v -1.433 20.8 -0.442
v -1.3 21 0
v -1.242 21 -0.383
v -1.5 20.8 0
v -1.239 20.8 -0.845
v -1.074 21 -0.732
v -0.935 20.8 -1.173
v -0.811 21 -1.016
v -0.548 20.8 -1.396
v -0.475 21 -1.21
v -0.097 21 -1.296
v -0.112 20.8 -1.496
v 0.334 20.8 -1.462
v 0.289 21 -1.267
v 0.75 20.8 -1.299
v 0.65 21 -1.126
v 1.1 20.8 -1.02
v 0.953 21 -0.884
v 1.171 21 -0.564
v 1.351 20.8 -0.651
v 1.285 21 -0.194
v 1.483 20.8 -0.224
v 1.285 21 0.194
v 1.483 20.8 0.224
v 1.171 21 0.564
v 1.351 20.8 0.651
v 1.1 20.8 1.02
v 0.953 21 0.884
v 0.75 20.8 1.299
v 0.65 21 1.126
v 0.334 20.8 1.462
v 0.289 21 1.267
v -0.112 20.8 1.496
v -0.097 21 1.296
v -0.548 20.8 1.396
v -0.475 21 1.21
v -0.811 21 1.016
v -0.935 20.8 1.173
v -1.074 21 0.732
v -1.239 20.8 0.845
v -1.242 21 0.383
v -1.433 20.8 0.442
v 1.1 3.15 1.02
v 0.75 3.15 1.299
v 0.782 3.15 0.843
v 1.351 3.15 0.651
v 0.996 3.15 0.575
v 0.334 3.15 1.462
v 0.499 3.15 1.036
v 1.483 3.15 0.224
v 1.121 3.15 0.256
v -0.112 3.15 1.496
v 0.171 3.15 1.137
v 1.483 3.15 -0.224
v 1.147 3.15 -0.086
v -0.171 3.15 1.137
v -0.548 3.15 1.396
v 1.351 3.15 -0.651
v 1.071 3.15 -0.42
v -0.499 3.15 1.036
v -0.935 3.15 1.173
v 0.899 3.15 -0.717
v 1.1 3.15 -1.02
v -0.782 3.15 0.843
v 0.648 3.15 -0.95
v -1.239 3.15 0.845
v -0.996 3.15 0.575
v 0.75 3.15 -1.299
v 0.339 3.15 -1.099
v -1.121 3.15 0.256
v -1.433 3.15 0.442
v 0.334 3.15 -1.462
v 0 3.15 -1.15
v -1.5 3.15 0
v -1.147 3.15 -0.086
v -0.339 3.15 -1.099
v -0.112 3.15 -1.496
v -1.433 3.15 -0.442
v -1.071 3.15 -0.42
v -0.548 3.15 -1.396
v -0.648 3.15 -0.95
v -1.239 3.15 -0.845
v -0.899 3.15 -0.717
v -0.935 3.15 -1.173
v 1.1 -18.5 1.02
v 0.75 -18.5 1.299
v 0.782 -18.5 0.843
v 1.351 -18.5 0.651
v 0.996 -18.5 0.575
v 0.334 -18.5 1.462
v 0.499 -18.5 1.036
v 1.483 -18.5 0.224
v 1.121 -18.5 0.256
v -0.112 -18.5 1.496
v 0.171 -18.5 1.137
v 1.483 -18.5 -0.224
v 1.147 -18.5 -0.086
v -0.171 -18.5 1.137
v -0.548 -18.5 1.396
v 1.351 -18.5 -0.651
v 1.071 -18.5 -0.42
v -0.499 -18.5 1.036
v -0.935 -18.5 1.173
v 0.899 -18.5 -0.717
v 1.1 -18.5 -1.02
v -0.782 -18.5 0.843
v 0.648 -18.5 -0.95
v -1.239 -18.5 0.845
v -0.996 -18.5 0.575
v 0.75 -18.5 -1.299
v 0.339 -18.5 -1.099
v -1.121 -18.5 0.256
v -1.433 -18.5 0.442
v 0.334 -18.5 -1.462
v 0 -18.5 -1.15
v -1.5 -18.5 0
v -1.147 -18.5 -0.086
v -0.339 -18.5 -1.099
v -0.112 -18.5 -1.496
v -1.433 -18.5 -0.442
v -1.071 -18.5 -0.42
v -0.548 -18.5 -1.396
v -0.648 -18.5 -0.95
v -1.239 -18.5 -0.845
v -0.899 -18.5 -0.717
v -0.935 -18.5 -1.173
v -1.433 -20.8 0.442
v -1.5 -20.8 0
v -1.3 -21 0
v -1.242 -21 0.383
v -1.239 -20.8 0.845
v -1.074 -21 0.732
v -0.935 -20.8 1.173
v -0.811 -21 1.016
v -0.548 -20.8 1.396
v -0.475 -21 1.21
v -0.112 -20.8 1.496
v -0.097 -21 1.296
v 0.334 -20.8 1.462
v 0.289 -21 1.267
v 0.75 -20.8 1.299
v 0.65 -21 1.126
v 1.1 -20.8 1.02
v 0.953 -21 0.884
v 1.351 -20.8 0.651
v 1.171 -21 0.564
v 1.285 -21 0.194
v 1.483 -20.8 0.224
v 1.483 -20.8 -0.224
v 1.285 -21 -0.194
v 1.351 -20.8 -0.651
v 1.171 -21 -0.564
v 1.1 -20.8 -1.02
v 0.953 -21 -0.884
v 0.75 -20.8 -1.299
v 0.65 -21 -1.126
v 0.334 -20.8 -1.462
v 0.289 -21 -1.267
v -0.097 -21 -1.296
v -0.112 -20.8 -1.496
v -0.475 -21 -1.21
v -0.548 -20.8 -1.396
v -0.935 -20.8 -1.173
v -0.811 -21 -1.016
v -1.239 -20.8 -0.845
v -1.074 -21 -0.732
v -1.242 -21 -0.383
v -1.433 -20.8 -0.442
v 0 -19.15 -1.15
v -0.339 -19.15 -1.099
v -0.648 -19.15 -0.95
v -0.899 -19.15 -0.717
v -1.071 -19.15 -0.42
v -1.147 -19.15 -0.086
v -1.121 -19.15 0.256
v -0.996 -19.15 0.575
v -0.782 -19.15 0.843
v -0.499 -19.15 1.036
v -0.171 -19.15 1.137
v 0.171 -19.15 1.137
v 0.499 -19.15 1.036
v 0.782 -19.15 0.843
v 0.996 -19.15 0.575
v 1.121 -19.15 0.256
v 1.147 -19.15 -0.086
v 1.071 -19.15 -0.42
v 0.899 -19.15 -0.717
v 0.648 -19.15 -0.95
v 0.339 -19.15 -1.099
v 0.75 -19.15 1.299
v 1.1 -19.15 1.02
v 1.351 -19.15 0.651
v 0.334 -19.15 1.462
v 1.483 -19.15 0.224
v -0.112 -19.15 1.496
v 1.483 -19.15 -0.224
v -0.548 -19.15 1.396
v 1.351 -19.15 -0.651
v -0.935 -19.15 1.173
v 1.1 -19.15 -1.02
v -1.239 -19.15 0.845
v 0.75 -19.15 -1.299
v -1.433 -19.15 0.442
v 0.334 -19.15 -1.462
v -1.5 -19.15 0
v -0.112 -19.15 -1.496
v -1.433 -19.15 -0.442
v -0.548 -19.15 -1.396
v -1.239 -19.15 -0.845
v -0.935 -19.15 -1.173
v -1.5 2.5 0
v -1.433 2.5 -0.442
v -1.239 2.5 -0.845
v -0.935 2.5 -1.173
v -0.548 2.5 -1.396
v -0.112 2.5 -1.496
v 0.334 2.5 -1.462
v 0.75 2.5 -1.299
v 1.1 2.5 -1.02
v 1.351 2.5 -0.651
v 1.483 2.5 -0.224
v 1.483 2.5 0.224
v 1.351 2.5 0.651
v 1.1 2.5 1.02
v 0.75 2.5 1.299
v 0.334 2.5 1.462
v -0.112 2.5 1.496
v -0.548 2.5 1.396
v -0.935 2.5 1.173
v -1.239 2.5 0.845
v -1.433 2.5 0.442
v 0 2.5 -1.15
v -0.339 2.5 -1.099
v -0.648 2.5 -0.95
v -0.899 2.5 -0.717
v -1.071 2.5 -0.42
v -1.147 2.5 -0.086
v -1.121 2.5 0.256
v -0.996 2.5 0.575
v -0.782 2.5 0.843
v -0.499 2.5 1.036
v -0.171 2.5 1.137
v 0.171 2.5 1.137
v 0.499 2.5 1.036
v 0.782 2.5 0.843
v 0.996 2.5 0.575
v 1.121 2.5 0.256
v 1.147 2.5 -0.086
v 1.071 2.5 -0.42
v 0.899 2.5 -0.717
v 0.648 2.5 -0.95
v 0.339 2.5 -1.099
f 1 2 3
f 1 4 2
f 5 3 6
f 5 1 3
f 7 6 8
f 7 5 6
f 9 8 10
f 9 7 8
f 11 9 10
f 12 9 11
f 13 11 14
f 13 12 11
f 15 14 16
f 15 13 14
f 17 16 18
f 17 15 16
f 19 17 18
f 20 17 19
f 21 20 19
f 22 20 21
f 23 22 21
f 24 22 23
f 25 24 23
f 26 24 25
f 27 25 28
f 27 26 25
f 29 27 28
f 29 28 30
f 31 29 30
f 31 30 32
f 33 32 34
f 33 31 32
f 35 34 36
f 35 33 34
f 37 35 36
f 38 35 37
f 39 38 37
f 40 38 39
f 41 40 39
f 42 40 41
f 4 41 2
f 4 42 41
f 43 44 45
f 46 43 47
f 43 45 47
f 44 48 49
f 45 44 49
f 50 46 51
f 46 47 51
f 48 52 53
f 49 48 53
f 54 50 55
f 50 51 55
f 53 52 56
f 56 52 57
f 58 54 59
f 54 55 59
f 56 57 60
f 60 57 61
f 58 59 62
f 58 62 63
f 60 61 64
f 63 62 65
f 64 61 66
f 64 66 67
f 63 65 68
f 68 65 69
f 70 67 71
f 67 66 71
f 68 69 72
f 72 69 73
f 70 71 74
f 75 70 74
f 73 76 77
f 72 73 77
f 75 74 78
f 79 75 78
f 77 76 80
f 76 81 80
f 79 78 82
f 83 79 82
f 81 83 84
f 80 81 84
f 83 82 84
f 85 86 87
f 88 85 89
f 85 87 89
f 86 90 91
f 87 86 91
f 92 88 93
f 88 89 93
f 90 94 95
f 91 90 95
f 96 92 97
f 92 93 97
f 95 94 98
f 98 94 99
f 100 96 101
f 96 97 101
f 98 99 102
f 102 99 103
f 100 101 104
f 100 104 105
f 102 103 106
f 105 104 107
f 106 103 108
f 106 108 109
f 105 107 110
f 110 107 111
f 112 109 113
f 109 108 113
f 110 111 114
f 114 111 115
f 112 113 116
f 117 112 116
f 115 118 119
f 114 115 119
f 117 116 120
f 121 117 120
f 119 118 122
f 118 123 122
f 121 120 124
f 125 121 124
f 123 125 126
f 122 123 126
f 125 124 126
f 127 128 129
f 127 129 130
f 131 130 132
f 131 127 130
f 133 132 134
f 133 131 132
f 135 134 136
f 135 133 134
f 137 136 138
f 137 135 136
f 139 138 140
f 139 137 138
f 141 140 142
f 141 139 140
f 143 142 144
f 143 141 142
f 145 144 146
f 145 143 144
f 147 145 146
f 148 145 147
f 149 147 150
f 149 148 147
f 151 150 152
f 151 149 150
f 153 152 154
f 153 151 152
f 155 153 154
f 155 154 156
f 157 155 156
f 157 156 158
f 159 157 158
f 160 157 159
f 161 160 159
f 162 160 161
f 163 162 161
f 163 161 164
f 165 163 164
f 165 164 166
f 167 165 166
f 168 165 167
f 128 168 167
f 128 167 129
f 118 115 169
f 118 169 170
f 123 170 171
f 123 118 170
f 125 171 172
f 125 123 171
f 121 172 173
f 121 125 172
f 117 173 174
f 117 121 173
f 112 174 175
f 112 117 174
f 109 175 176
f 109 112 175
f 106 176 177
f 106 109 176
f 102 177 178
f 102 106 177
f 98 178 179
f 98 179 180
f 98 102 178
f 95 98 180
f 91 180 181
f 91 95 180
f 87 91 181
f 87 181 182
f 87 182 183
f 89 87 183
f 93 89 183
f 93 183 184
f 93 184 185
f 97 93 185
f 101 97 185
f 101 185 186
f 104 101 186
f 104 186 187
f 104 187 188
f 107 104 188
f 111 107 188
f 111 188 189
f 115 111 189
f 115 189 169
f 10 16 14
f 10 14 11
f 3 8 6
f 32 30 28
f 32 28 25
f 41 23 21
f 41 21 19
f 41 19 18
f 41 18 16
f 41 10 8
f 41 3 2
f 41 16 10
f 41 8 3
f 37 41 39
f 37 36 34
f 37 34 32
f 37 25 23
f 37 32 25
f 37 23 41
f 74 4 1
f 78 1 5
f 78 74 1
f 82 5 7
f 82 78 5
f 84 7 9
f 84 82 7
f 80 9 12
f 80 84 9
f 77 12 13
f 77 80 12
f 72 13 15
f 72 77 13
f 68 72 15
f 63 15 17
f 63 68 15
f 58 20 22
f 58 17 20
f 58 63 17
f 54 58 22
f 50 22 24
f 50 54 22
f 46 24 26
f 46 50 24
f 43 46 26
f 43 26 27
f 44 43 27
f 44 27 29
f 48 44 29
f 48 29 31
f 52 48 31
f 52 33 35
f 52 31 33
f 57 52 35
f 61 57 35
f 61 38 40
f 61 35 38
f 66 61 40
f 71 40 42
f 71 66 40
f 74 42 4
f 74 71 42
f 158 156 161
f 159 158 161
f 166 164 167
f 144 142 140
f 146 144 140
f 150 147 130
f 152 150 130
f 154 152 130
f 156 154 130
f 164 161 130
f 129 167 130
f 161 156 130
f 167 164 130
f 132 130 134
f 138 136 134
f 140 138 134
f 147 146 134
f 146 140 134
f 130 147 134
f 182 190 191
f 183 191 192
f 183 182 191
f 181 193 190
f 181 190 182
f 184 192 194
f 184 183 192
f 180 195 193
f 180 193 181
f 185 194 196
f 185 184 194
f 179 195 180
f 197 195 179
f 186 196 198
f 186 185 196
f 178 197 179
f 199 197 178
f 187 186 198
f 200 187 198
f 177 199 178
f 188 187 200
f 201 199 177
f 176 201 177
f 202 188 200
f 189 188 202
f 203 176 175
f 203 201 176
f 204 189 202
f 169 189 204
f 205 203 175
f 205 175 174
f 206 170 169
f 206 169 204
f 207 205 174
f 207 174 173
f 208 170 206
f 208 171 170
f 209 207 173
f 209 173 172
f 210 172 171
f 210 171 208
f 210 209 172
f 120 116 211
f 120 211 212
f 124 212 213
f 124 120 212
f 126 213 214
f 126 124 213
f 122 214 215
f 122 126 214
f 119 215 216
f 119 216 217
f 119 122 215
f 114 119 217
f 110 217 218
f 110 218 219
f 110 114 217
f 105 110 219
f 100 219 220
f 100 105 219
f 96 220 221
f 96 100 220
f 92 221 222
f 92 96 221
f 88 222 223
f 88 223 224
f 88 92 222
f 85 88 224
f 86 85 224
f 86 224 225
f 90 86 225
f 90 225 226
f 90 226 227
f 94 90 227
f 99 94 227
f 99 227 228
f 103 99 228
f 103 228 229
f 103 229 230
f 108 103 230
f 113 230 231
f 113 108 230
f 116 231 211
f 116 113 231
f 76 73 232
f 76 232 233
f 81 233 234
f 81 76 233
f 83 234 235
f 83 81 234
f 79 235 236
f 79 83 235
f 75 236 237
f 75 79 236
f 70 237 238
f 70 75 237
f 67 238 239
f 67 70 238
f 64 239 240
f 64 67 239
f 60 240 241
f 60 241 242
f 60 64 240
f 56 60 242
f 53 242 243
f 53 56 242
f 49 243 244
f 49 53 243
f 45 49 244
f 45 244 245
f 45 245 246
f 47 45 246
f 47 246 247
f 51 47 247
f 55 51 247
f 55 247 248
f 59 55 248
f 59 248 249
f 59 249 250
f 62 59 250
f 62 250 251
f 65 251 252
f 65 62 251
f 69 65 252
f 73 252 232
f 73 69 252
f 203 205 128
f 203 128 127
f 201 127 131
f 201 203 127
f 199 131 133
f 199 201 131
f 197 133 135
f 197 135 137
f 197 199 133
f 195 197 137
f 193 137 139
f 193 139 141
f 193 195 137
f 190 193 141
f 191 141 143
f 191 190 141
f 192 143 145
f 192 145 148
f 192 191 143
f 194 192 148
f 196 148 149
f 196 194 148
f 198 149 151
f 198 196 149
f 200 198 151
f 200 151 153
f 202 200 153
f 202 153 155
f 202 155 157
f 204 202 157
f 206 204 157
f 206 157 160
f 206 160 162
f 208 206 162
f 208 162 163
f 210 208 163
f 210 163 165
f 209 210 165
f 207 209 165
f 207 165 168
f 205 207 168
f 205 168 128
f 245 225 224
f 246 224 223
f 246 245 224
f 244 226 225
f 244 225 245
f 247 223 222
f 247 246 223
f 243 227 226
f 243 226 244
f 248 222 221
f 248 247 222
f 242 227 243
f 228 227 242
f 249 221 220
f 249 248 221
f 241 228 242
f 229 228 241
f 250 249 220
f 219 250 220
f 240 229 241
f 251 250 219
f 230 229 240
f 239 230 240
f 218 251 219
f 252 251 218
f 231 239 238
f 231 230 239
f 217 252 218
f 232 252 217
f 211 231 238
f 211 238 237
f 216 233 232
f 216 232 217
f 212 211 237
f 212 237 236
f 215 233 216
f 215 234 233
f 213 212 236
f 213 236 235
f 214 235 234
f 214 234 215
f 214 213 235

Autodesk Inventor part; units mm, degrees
ref_plane "YZ Plane" through (0, 0, 0) normal (1, 0, 0) x (0, 1, 0)
ref_plane "XZ Plane" through (0, 0, 0) normal (0, 1, 0) x (-1, 0, 0)
ref_plane "XY Plane" through (0, 0, 0) normal (0, 0, 1) x (1, 0, 0)
sketch "Sketch4" plane through (0, 0, 0) normal (0, 1, 0) x (-1, 0, 0)
  circle A0 centre (0, 0) radius 1.5
extrude "Extrusion2" add sketch "Sketch4" along normal mid plane 42
thread "Thread1" size "M3x0.5" class "6g" standard "ANSI Metric M Profile" length 10
chamfer "Chamfer1" distance 0.2 angle 45 2 edges at (1.5, 21, 0) (1.5, -21, 0)
sketch "Sketch14" plane through (0, 0, 0) normal (1, 0, 0) x (0, 1, 0)
  line L0 (-20.8, -1.5) -> (20.8, -1.5) projected
  line L1 (3.15, -1.5) -> (2.5, -1.5)
  line L2 (2.5, -1.5) -> (2.5, -1.15)
  line L3 (2.5, -1.15) -> (3.15, -1.15)
  line L4 (3.15, -1.15) -> (3.15, -1.5)
  line L5 (-21, -1.3) -> (-21, 1.3) projected
  line L6 (-21, 0) -> (13, 0) construction
  line L7 (-20.8, -1.5) -> (20.8, -1.5) projected
  line L8 (-18.5, -1.5) -> (-19.15, -1.5)
  line L9 (-19.15, -1.5) -> (-19.15, -1.15)
  line L10 (-19.15, -1.15) -> (-18.5, -1.15)
  line L11 (-18.5, -1.15) -> (-18.5, -1.5)
  point P0 (0, 0)
  point P1 (-19.15, -1.5)
  dimension "d105" = 1.15
  dimension "d106" = 0.65
  dimension "d107" = 23.5
  dimension "d109" = 0.65
  dimension "d110" = 1.15
  dimension "d111" = 21
revolve "Revolution1" cut sketch "Sketch14" angle 360 about axis through (0, -21, 0) along (0, 1, 0)
equation "\"d109\" = d106"
equation "\"d110\" = d105"
properties part number "Ball Track Support" material "Bronze, Soft Tin"
